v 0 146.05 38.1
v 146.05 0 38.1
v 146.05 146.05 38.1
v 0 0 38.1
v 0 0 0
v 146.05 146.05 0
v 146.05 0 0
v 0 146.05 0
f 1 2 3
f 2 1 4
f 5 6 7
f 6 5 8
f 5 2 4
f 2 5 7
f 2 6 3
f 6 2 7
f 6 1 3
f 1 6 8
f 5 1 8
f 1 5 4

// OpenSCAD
// simple 2D -> 3D extrusion of a rectangle
color("gray")
  cube([146.05,146.05,38.1]);
